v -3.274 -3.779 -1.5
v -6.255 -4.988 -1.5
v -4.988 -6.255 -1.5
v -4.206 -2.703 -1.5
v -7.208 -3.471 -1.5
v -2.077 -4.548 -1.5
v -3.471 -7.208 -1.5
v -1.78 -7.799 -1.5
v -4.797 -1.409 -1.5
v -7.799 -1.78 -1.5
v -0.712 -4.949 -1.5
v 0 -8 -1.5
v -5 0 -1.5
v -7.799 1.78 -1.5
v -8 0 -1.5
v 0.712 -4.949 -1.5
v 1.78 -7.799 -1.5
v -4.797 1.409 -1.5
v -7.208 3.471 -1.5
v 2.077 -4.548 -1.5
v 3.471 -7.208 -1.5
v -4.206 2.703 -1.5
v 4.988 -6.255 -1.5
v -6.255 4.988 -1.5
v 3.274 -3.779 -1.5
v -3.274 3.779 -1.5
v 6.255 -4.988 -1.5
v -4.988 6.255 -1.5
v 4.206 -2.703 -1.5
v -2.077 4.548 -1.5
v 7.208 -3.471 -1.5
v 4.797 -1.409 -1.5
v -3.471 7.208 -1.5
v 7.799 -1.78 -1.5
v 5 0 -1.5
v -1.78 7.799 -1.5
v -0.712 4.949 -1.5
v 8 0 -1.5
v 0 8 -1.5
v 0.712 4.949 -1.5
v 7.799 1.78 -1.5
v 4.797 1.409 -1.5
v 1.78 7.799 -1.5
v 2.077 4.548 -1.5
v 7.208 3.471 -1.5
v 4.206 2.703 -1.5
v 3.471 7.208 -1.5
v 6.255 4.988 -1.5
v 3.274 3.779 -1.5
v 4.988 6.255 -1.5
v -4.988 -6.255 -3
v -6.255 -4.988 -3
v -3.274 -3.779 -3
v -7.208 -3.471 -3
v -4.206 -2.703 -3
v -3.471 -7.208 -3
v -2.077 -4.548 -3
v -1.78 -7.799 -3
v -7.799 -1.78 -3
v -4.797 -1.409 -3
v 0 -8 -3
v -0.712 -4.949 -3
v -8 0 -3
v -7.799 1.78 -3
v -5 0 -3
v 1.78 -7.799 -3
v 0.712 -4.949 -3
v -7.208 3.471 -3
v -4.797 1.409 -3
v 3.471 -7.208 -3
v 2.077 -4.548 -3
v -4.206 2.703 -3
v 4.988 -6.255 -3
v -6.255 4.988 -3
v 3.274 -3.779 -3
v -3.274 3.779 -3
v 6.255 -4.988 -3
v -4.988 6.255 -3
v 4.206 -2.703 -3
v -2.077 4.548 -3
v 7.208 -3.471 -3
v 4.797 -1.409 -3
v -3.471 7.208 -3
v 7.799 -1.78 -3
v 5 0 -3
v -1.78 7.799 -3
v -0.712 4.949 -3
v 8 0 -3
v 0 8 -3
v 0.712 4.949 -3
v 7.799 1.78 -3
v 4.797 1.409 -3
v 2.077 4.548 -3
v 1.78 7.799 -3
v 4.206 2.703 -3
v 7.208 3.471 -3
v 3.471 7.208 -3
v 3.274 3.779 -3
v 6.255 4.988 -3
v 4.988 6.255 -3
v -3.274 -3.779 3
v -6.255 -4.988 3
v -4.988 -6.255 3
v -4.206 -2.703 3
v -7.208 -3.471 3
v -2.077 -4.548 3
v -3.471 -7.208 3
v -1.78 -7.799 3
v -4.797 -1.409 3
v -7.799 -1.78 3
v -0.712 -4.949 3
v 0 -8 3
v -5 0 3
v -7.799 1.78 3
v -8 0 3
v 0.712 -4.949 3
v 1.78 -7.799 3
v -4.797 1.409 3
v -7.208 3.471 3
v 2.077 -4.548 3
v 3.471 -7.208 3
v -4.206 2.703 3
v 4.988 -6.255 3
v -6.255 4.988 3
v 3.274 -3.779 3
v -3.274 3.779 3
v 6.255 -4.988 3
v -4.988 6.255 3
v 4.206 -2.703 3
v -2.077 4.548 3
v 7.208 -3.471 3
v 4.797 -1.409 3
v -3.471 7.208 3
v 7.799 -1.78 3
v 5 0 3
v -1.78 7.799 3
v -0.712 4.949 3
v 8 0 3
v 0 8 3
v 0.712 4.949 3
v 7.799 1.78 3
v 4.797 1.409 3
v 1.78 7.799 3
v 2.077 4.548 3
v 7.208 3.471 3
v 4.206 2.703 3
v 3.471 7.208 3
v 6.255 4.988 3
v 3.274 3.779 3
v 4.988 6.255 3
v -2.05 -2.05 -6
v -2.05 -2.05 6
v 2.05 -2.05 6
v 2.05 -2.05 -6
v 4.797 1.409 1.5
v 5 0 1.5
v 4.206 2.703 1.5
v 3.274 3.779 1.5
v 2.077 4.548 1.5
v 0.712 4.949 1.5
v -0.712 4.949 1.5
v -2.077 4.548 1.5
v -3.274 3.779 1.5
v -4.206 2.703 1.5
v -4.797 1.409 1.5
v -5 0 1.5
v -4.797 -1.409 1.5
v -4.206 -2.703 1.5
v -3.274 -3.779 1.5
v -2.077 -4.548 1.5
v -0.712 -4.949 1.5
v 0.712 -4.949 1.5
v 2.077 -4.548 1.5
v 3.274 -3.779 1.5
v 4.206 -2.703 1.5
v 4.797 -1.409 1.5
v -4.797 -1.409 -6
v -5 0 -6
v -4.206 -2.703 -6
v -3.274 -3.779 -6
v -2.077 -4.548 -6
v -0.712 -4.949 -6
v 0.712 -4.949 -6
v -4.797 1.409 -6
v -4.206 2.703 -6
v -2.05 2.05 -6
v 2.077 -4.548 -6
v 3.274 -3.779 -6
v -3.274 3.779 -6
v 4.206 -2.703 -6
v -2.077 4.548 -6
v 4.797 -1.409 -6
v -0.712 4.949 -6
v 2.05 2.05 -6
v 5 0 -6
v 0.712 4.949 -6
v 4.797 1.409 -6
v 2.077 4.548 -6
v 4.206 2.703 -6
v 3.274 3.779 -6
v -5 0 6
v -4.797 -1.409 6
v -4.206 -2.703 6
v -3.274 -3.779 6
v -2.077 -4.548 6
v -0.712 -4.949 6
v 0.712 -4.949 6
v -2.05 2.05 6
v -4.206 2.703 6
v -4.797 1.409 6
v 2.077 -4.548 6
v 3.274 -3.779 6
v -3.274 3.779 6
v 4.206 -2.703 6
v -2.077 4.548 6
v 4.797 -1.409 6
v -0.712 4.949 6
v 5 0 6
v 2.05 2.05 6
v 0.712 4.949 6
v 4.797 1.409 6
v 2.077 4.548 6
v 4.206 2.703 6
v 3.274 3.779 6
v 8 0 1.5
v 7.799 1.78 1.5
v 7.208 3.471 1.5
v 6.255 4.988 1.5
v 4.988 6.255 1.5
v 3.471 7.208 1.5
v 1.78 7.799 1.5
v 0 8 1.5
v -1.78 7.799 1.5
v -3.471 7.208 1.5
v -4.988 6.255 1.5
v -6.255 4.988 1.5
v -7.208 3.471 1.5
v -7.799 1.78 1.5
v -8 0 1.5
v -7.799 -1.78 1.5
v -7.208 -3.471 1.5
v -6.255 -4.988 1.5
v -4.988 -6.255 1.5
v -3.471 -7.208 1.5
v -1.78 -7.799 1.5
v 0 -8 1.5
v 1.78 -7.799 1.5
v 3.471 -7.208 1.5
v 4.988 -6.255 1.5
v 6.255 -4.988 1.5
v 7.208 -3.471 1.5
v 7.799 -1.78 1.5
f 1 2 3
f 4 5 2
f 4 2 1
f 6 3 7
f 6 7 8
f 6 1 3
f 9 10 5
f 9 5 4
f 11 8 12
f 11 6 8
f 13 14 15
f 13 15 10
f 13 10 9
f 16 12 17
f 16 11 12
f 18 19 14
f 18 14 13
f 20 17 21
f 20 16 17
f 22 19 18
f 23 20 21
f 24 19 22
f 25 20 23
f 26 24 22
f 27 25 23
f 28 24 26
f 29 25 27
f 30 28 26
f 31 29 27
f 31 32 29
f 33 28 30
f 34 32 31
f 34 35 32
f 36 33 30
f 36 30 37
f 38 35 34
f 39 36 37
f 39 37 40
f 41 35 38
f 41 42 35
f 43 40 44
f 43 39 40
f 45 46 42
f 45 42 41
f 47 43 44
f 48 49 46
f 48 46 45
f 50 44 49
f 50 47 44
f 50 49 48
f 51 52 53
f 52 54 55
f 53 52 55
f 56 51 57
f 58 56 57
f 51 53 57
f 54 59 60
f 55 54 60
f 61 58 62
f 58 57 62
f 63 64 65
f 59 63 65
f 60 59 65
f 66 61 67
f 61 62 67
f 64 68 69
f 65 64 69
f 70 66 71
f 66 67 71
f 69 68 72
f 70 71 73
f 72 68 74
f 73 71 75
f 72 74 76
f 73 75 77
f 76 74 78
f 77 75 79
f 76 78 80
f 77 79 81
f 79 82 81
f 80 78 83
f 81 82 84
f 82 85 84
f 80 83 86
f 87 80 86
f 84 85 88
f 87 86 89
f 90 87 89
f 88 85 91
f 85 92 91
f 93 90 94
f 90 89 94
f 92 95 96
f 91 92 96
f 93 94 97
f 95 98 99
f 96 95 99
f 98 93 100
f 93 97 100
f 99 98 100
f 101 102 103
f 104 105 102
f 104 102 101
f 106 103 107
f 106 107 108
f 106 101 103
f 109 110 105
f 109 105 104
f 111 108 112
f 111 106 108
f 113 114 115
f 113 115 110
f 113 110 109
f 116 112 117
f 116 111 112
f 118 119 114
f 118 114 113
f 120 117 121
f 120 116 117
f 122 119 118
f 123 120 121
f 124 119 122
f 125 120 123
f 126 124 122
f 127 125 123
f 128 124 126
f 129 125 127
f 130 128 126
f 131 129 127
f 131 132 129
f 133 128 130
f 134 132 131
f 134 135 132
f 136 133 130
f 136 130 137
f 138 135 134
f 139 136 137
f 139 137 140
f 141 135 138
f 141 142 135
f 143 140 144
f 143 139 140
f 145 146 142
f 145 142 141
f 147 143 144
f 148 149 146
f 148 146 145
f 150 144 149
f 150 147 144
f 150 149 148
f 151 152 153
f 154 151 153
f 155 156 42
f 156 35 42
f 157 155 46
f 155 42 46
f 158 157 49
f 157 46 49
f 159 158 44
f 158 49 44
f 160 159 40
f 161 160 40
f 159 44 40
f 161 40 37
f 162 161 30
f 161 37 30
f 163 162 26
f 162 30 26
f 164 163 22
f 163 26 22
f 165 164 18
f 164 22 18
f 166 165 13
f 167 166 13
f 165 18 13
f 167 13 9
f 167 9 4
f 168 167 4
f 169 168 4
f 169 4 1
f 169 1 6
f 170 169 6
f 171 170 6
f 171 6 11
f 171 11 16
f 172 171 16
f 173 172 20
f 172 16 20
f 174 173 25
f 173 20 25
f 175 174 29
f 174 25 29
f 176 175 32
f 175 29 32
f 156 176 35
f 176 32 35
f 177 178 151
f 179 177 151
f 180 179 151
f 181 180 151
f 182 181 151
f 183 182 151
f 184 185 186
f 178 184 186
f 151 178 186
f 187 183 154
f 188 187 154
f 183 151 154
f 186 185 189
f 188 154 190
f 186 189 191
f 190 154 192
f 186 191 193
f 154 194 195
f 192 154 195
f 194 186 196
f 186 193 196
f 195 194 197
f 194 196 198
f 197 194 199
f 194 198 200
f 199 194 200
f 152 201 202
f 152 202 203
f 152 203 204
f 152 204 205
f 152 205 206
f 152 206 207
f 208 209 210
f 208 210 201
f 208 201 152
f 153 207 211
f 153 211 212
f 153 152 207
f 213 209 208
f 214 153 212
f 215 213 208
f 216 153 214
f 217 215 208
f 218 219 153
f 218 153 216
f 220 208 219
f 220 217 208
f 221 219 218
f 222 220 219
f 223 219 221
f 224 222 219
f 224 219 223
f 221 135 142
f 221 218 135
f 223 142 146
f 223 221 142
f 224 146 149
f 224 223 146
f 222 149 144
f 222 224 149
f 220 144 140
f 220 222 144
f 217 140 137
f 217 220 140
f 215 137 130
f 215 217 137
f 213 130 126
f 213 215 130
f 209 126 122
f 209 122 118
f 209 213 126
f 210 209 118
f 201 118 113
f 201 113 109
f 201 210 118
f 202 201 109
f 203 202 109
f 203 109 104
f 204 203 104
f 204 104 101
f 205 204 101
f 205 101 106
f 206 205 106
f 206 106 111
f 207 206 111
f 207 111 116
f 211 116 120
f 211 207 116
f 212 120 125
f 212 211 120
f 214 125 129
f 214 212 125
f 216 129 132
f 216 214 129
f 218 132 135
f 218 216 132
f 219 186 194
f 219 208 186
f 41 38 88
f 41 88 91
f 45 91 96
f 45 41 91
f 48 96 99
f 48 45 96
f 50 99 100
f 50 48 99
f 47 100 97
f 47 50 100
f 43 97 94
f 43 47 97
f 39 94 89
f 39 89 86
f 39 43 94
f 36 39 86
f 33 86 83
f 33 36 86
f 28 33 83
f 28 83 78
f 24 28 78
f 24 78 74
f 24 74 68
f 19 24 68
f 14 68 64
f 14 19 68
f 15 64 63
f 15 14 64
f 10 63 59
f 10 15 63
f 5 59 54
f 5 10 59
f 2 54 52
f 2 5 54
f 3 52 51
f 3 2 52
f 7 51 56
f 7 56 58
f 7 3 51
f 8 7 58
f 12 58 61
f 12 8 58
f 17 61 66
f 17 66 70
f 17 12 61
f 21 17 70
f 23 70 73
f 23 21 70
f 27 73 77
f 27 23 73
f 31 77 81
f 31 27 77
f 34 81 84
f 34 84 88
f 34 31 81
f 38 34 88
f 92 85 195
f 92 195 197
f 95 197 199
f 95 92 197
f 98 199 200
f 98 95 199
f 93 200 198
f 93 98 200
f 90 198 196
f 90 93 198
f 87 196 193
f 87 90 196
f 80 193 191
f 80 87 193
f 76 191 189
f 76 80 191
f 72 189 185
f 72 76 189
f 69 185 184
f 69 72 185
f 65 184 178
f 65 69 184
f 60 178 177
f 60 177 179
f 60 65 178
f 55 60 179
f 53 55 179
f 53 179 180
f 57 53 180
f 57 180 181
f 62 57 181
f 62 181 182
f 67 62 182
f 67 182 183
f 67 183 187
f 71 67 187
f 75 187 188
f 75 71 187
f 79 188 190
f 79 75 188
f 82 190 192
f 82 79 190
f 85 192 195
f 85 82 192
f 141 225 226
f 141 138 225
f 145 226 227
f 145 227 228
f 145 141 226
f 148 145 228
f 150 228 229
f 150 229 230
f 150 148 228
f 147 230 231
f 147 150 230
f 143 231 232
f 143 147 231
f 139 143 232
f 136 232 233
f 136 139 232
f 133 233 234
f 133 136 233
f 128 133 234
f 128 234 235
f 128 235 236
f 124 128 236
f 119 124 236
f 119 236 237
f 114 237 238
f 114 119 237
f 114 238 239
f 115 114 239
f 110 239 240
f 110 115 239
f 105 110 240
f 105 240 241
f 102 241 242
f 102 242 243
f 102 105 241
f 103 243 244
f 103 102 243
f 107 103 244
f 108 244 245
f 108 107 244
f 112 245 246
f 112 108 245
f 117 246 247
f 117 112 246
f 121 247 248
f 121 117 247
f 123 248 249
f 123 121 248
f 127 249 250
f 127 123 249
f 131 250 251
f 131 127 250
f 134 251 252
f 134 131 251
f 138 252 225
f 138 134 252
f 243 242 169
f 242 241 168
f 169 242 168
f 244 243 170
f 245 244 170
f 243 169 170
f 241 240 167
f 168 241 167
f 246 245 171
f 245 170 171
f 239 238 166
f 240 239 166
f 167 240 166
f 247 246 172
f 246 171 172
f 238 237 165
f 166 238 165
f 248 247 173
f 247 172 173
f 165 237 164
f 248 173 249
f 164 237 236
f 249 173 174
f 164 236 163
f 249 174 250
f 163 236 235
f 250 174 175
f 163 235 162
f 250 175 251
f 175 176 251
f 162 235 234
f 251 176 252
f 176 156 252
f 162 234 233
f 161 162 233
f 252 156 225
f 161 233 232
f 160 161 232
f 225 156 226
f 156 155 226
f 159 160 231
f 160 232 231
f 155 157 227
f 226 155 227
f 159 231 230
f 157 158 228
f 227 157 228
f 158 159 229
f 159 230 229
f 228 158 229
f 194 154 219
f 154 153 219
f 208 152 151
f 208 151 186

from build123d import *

# Parameters (mm, degrees)
SKETCH1_R               = 5
SKETCH1_W               = 4.1
SKETCH1_H               = 4.1
BOSS_EXTRUDE1_DEPTH     = 6
SKETCH1_3_R             = 8
SKETCH1_3_R_2           = 5
BOSS_EXTRUDE2_DEPTH     = 3
SKETCH1_6_R             = 8
SKETCH1_6_R_2           = 5
CUT_EXTRUDE_THIN1_DEPTH = 1.5


with BuildPart() as part:
    # Sketch1 → Boss-Extrude1 (new, symmetric)
    with BuildSketch(Plane.XY):
        Circle(SKETCH1_R)
        Rectangle(SKETCH1_W, SKETCH1_H, mode=Mode.SUBTRACT)
    extrude(amount=BOSS_EXTRUDE1_DEPTH, both=True)

    # Sketch1<3> → Boss-Extrude2 (add, symmetric)
    # profile 1 of 2: a face of its own
    with BuildSketch(Plane.XY):
        Circle(SKETCH1_3_R)
        Circle(SKETCH1_3_R_2, mode=Mode.SUBTRACT)
    # profile 2 of 2: a face of its own
    with BuildSketch(Plane.XY):
        Circle(SKETCH1_3_R)
        Circle(SKETCH1_3_R_2, mode=Mode.SUBTRACT)
    extrude(amount=BOSS_EXTRUDE2_DEPTH, both=True)

    # Sketch1<6> → Cut-Extrude-Thin1 (cut, symmetric)
    with BuildSketch(Plane.XY):
        Circle(SKETCH1_6_R)
        Circle(SKETCH1_6_R_2, mode=Mode.SUBTRACT)
    extrude(amount=CUT_EXTRUDE_THIN1_DEPTH, both=True, mode=Mode.SUBTRACT)


solid = part.part
